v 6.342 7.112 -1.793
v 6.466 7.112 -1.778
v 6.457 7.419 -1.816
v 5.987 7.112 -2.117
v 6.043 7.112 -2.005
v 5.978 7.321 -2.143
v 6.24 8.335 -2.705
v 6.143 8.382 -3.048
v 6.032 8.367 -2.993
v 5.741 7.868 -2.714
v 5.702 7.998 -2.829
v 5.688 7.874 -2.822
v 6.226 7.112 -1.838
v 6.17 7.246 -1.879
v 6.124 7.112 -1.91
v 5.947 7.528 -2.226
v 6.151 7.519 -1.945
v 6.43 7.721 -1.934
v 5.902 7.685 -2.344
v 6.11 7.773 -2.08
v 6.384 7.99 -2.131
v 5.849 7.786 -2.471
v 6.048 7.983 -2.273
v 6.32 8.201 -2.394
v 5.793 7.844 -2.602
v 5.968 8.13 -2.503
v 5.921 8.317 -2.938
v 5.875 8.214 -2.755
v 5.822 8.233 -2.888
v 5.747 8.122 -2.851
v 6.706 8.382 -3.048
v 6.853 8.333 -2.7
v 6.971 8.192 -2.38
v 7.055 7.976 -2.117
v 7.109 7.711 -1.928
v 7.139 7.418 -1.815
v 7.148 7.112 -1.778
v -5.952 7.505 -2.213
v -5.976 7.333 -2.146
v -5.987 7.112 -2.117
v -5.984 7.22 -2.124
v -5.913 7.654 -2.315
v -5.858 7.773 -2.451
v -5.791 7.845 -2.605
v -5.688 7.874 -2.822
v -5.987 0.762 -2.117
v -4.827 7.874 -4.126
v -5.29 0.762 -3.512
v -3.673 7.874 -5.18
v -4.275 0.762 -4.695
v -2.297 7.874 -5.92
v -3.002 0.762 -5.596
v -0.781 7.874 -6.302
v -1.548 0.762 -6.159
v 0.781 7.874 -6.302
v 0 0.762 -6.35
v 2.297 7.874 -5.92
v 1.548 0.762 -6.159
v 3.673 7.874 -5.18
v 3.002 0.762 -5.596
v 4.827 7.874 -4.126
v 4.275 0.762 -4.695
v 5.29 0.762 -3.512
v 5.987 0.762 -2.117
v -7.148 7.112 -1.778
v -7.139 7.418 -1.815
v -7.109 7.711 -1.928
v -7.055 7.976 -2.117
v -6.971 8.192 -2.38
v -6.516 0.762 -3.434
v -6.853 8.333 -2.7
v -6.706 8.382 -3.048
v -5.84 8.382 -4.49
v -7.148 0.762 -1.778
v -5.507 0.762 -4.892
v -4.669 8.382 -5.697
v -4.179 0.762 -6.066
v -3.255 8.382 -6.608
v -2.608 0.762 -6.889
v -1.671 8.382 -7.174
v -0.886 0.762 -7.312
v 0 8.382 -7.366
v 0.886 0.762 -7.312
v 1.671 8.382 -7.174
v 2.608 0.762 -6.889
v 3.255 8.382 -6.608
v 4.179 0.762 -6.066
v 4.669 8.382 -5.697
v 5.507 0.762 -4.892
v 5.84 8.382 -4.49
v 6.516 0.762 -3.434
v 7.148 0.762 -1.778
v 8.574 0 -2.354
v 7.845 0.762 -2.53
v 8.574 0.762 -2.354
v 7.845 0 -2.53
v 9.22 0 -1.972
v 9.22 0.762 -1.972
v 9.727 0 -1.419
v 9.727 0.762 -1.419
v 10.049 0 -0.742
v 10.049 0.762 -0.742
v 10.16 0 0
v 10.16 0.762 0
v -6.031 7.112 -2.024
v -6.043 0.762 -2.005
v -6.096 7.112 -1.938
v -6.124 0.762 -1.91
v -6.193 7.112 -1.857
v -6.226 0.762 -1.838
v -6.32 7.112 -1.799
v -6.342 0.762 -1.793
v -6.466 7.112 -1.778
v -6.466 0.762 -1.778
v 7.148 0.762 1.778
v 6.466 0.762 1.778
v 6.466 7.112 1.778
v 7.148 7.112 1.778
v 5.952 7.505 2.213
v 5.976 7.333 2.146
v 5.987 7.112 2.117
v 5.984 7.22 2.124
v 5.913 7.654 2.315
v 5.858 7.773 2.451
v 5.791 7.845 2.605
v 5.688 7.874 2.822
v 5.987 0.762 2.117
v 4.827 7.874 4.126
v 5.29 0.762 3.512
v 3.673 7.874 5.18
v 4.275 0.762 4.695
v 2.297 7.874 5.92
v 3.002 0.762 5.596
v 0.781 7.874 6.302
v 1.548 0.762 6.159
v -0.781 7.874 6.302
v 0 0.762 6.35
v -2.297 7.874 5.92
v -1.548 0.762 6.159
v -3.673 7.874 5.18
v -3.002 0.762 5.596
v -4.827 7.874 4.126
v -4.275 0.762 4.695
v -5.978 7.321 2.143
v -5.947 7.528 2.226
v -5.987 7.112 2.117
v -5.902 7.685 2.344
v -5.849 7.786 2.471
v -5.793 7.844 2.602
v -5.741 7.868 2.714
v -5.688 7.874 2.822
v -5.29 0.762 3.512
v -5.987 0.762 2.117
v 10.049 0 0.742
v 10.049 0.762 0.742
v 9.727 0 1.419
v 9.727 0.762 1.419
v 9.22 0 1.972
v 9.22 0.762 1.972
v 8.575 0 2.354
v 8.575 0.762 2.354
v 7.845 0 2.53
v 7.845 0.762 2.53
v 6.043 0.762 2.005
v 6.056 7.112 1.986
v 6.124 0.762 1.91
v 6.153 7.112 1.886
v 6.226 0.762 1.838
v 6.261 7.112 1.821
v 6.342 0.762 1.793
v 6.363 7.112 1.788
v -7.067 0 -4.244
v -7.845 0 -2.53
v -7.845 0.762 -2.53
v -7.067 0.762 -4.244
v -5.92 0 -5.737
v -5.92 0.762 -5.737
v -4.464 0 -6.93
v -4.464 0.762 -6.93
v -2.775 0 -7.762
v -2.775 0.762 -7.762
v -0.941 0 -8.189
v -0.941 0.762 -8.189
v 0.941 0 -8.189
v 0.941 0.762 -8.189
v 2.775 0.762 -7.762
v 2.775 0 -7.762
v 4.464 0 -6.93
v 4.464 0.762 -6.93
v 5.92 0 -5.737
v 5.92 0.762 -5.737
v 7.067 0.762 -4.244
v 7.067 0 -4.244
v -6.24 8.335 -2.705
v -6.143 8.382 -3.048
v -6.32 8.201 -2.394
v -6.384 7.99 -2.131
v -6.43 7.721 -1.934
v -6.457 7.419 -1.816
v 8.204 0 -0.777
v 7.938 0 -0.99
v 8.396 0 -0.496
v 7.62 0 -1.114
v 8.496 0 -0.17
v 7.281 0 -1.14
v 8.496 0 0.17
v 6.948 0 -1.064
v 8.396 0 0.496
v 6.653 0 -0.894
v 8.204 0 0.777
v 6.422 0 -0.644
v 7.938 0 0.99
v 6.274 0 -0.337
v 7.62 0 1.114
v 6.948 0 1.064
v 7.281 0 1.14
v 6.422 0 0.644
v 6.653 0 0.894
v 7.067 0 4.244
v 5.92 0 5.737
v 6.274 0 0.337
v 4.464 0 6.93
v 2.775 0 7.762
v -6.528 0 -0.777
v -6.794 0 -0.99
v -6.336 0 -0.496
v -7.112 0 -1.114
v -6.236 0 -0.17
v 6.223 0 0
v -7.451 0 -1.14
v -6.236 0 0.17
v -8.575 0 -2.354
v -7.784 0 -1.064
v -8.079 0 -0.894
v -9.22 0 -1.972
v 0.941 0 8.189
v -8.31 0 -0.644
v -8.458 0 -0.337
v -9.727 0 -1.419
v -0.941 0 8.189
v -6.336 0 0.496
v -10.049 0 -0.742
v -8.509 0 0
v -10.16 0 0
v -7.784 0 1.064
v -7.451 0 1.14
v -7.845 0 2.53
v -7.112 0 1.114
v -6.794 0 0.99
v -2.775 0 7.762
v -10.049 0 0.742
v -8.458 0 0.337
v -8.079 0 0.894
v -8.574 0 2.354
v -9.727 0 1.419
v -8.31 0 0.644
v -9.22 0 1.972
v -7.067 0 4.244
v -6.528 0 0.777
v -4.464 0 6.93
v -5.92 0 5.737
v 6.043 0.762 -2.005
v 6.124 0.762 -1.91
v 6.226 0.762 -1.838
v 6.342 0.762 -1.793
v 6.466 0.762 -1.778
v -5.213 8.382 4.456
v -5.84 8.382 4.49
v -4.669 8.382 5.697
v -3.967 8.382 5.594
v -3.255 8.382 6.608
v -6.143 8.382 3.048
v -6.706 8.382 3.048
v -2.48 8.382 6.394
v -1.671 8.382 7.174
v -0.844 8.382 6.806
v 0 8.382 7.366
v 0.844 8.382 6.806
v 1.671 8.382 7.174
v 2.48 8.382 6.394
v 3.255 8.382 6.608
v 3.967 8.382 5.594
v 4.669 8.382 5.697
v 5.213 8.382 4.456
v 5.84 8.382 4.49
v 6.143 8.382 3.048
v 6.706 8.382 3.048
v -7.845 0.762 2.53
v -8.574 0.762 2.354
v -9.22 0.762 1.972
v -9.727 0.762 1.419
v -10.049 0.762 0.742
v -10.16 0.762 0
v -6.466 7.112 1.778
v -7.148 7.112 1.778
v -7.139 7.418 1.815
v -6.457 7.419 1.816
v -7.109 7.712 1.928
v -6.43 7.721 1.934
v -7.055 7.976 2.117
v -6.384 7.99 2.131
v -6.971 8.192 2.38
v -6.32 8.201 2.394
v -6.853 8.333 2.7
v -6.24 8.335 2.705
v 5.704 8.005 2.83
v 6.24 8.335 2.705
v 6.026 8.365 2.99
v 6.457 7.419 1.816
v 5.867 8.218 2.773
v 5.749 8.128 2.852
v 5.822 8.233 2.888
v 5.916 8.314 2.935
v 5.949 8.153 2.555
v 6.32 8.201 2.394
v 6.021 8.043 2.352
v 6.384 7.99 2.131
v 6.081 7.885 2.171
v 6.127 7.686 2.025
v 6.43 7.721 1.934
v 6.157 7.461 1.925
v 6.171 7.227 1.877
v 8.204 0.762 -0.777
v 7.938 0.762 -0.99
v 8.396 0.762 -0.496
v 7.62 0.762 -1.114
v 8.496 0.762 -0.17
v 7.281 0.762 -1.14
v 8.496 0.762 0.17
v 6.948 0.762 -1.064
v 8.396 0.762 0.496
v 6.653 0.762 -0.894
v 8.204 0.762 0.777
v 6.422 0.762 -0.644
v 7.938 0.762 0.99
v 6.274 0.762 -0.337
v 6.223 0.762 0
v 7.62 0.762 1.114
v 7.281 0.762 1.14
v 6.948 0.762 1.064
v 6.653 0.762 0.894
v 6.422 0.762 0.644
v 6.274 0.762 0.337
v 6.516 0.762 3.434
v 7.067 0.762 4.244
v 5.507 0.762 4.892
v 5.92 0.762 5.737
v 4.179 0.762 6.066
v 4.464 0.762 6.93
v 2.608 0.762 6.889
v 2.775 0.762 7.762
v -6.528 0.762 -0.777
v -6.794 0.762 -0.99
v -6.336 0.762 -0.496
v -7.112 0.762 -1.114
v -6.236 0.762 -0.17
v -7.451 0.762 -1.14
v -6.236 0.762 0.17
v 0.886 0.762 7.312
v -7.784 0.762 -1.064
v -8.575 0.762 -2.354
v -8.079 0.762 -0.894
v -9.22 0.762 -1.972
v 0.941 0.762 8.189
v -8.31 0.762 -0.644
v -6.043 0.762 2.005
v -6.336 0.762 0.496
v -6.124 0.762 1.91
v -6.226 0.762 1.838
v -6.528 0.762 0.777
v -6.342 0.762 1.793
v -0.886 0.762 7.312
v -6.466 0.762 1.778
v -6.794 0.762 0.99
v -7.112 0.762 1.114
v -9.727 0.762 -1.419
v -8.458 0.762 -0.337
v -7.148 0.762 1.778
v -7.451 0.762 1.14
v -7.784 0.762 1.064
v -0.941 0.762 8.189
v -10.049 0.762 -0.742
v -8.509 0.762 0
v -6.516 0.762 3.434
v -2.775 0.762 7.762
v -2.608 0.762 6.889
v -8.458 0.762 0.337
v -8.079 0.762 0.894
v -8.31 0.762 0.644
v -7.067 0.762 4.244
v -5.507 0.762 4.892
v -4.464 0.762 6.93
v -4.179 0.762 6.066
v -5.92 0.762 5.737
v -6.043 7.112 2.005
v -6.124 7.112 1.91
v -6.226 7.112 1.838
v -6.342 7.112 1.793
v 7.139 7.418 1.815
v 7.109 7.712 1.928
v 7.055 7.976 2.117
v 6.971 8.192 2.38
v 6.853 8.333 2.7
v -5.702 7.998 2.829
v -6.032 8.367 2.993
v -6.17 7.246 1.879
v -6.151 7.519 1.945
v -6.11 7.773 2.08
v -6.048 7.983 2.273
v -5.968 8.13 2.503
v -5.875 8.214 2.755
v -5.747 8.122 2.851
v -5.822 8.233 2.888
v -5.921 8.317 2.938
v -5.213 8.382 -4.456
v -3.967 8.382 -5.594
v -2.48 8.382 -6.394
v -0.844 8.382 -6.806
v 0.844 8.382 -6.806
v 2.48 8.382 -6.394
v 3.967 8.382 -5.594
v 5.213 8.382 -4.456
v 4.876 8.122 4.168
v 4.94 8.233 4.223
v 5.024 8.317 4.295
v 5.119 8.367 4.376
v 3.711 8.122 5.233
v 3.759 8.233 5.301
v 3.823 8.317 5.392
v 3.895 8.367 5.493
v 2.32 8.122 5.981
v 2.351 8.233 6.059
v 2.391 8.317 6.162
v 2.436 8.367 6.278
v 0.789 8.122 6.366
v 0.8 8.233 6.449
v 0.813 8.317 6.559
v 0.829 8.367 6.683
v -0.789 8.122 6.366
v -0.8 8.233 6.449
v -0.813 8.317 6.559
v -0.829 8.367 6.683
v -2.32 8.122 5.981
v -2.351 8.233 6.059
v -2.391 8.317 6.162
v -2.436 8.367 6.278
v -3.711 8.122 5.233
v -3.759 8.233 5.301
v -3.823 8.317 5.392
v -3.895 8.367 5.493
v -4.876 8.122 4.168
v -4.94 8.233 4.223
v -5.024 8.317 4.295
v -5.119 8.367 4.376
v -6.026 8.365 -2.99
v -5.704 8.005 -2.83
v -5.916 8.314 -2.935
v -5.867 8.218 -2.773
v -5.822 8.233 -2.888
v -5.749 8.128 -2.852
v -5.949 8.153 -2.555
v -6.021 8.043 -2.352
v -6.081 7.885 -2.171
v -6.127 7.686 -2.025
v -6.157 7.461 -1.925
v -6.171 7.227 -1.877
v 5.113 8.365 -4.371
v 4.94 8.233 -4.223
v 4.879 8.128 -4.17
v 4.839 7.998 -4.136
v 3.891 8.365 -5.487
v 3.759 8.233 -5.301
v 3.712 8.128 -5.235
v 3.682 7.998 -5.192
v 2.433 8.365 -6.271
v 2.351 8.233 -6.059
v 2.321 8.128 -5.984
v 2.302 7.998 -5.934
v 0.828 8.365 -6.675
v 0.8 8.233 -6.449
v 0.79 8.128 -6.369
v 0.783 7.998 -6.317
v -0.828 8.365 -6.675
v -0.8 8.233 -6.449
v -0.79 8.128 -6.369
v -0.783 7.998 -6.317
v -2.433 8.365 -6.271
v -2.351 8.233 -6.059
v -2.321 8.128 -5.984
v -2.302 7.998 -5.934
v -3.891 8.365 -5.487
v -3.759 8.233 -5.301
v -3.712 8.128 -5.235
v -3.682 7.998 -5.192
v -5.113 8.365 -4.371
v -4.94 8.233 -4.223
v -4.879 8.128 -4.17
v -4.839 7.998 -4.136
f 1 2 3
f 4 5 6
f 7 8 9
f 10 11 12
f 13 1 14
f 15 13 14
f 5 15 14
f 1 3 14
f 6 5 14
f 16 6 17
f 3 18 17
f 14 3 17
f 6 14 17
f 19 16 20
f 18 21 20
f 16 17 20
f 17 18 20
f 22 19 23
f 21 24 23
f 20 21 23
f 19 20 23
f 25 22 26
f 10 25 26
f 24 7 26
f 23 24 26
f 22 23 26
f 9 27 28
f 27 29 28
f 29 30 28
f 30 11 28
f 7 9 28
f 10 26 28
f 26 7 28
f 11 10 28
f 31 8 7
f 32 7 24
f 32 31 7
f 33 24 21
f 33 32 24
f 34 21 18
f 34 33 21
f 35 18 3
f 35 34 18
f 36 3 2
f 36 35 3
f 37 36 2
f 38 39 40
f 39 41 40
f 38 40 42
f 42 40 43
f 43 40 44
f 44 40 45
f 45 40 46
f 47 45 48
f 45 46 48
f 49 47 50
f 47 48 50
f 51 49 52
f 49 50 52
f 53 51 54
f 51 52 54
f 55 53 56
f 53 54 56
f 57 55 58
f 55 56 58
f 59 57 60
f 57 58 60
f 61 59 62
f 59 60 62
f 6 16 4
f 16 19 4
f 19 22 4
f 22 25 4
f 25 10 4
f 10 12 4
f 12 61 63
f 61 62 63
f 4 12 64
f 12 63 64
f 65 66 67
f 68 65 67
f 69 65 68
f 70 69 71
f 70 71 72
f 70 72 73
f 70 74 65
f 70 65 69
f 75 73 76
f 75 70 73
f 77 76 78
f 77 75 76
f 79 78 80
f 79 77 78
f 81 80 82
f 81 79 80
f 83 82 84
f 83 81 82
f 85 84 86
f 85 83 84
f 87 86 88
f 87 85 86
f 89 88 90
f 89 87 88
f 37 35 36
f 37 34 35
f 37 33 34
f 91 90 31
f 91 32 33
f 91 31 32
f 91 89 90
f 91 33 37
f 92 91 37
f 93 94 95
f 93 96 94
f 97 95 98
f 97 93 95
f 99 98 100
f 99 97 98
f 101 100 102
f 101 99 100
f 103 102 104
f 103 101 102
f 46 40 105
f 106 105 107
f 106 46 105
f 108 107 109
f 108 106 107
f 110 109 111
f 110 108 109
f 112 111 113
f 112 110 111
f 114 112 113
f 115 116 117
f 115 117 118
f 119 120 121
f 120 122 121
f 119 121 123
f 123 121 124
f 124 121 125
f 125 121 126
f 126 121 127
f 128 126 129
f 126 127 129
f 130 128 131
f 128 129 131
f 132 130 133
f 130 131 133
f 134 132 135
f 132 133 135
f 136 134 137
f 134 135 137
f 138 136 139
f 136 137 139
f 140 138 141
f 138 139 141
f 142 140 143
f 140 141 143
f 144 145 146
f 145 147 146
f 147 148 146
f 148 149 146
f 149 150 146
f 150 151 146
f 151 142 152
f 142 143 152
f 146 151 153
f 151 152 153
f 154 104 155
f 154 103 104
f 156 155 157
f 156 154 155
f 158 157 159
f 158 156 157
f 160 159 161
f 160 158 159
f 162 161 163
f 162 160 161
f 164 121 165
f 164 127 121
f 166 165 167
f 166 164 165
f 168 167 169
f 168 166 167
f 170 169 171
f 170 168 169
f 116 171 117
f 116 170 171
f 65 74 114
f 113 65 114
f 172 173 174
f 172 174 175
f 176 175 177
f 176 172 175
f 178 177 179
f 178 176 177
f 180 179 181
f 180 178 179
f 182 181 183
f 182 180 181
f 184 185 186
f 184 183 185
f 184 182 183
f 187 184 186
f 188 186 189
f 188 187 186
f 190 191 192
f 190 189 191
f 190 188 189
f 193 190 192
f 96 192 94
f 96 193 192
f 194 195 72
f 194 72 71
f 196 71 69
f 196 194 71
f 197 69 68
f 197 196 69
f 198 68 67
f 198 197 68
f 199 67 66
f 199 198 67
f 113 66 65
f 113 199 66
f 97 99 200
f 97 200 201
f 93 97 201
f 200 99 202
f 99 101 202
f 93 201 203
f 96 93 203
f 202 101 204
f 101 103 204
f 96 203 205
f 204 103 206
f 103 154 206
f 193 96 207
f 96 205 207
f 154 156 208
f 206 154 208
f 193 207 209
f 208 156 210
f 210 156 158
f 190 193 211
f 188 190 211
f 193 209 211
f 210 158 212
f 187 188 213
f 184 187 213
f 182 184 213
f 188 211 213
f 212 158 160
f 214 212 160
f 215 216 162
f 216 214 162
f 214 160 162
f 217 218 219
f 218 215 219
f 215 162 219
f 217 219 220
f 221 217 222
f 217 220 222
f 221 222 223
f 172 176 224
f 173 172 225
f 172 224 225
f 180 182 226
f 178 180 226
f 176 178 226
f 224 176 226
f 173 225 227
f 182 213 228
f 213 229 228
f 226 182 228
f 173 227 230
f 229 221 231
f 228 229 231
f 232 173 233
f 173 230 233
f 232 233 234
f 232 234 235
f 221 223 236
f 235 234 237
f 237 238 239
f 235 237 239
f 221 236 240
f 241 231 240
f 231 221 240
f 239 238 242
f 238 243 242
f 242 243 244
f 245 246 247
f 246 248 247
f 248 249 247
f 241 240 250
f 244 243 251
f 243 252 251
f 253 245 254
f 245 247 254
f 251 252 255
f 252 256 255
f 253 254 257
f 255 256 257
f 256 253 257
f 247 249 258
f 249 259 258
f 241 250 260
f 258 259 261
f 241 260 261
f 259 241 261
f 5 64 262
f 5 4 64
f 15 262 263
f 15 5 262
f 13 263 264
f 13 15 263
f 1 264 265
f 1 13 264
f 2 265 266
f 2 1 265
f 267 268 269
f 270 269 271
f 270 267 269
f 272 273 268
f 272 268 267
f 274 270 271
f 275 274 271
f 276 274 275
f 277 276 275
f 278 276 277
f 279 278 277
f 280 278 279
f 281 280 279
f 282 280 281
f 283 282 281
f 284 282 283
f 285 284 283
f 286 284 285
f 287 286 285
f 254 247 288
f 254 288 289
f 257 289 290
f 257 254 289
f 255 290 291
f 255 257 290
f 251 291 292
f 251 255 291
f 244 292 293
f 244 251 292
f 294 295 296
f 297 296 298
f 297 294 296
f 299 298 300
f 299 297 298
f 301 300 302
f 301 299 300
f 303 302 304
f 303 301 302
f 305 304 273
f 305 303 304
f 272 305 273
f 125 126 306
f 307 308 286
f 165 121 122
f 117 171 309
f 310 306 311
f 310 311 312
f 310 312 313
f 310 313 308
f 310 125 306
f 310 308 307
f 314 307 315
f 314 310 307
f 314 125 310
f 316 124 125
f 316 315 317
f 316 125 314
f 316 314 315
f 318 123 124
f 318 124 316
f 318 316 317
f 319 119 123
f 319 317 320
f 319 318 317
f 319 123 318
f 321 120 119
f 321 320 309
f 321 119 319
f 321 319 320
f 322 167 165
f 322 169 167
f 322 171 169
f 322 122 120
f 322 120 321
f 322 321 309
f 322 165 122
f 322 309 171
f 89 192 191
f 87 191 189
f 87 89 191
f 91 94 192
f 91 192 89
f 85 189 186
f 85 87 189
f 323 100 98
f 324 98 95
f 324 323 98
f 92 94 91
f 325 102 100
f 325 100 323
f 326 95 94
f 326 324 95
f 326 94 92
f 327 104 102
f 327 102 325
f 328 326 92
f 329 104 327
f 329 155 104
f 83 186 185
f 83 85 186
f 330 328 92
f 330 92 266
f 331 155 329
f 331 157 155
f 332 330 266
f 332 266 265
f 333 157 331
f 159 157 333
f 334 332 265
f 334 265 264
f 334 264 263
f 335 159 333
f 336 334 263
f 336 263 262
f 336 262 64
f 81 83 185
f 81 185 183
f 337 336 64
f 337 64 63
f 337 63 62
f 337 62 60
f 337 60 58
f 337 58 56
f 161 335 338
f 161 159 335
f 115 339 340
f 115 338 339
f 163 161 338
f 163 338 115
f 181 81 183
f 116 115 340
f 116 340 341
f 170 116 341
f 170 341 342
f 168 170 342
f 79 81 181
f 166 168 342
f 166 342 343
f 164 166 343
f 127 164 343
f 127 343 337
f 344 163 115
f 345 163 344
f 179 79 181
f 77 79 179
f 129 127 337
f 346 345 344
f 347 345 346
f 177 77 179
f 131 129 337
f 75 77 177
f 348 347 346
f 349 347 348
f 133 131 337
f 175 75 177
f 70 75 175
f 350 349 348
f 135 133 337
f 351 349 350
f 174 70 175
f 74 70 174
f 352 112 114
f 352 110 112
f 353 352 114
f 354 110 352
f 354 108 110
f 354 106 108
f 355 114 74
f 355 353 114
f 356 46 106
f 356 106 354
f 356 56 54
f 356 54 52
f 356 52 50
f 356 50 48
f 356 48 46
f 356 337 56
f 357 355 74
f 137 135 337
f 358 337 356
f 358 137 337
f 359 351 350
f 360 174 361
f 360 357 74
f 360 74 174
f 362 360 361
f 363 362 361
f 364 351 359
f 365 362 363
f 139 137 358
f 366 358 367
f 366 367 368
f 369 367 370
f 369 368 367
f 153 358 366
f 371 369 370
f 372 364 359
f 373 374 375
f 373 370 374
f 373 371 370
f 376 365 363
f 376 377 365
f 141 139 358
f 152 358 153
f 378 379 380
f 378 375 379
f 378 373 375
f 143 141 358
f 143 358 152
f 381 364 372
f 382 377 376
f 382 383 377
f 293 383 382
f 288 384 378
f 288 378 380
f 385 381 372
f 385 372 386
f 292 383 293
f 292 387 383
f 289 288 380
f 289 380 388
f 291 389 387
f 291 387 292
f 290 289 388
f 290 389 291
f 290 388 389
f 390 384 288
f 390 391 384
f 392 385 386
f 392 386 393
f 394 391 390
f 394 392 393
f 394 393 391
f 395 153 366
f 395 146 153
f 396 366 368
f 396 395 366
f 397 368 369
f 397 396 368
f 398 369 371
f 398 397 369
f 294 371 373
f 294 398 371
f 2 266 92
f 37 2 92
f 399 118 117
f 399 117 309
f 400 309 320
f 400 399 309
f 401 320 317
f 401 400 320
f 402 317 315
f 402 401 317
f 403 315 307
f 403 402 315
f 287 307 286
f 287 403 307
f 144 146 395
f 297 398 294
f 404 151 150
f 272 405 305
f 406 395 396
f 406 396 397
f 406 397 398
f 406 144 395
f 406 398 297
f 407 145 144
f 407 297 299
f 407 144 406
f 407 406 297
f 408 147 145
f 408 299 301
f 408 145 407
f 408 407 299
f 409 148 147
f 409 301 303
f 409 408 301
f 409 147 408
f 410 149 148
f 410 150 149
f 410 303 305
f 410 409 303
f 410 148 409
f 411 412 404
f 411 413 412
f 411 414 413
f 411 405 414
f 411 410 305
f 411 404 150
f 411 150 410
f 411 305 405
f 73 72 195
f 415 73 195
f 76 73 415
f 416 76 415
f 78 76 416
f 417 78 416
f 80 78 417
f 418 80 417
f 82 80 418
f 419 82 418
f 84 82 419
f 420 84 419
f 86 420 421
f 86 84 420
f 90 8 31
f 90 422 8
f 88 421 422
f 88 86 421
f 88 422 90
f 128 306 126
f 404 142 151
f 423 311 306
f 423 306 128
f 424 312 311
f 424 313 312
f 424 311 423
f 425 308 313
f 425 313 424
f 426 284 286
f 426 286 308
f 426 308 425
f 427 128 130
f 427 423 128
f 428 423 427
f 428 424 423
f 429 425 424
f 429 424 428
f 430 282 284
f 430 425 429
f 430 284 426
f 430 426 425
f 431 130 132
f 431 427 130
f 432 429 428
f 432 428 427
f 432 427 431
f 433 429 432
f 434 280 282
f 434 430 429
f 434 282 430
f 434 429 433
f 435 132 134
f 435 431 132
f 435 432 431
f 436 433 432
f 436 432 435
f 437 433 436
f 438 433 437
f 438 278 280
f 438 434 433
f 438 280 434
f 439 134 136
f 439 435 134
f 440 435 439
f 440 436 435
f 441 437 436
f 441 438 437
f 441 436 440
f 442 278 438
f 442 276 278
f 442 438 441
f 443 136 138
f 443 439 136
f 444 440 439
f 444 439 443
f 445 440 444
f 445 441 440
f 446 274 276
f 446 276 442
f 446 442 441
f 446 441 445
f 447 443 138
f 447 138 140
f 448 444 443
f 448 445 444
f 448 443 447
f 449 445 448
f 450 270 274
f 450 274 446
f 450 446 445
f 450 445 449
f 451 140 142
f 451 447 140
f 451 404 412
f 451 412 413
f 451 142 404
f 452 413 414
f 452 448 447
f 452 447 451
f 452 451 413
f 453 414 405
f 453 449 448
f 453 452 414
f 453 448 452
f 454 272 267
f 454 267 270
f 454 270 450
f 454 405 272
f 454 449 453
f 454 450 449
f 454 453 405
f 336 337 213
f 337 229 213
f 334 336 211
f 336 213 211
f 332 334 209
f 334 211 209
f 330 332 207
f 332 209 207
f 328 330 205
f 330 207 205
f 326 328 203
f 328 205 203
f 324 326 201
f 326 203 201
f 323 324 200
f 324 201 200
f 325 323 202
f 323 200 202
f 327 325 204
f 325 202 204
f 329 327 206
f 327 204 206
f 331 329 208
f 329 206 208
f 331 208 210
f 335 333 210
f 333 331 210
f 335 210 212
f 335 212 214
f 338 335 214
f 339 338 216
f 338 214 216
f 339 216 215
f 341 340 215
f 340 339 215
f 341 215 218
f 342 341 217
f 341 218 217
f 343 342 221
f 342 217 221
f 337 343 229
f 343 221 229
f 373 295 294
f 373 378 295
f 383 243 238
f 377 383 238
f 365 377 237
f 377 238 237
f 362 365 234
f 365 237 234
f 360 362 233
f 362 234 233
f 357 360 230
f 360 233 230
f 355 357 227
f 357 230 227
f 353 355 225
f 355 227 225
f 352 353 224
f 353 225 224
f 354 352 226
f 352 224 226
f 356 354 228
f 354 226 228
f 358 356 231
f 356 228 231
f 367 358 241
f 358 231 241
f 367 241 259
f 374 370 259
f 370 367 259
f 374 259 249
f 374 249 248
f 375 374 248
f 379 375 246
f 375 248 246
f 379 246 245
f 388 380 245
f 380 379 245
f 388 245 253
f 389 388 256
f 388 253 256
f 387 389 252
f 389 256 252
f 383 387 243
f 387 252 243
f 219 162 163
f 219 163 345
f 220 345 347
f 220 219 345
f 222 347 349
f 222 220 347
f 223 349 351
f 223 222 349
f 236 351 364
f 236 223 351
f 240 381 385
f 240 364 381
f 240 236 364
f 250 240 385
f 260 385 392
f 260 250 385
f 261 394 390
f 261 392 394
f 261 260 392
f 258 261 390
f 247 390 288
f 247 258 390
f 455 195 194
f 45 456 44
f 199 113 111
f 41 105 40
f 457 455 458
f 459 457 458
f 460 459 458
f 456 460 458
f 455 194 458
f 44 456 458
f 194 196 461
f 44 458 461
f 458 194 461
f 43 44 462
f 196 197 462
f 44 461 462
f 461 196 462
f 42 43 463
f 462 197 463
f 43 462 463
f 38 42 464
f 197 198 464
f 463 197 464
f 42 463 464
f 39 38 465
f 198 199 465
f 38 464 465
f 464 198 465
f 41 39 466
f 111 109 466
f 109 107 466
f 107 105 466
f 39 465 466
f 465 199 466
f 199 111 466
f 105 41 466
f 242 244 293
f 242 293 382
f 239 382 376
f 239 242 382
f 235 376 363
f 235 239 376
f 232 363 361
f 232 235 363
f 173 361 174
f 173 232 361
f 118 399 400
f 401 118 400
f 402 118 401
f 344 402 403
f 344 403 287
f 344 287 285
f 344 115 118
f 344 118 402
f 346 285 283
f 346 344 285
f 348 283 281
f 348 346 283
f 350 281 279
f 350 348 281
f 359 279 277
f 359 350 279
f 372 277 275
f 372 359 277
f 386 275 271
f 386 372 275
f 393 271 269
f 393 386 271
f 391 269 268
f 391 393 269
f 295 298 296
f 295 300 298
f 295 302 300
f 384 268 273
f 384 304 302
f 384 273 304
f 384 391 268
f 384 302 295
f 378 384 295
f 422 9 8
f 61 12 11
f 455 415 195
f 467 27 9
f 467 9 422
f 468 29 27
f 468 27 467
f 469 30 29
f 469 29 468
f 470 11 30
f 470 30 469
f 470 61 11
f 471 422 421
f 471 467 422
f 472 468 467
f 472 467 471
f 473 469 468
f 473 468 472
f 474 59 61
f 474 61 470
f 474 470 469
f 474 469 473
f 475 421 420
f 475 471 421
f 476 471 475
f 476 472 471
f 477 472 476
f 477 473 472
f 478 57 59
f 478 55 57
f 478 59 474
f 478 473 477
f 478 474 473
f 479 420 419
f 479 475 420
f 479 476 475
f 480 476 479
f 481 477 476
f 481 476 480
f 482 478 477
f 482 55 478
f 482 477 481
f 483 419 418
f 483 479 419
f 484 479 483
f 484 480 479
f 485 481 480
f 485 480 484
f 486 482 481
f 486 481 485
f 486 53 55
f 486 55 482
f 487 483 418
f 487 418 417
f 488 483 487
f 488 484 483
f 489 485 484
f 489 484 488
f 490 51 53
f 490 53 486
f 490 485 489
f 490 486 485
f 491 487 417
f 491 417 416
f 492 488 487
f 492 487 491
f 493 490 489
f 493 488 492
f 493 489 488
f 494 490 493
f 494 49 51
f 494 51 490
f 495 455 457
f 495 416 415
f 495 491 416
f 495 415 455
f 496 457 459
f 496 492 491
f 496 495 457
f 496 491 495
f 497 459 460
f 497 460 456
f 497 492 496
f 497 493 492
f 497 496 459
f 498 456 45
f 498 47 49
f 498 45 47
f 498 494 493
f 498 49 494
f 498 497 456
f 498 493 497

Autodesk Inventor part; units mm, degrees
ref_plane "YZ Plane" through (0, 0, 0) normal (1, 0, 0) x (0, 1, 0)
ref_plane "XZ Plane" through (0, 0, 0) normal (0, 1, 0) x (-1, 0, 0)
ref_plane "XY Plane" through (0, 0, 0) normal (0, 0, 1) x (1, 0, 0)
sketch "Sketch1" plane through (0, 0, 0) normal (0, 1, 0) x (-1, 0, 0)
  circle A0 centre (-7.366, 0) radius 1.143
  circle A1 centre (7.366, 0) radius 1.143
  line L0 (10.16, 0) -> (10.16, 0)
  line L1 (10.16, 0) -> (10.16, 0)
  line L2 (-10.16, 0) -> (-10.16, 0)
  line L3 (-10.16, 0) -> (-10.16, 0)
  arc A2 (-10.16, 0) -> (-7.62, -2.54) centre (-7.62, 0) ccw
  arc A3 (-7.8454, 2.53) -> (-10.16, 0) centre (-7.62, 0) ccw
  arc A4 (10.16, 0) -> (7.8454, 2.53) centre (7.62, 0) ccw
  arc A5 (7.8454, -2.53) -> (10.16, 0) centre (7.62, 0) ccw
  arc A6 (7.8454, 2.53) -> (-7.8454, 2.53) centre (0, 0) ccw
  arc A7 (-7.8454, -2.53) -> (7.8454, -2.53) centre (0, 0) ccw
  dimension "d2" = 2.286
  dimension "d15" = 2.54
  dimension "d16" = 2.54
  dimension "d17" = 2.54
extrude "Extrusion1" add sketch "Sketch1" along normal blind 0.762
sketch "Sketch2" plane through (0, 0.762, 0) normal (0, 1, 0) x (1, 0, 0)
  point P0 (0, 0)
sketch "Sketch3" plane through (0, 0.762, 0) normal (0, 1, 0) x (1, 0, 0)
  line L0 (-7.2575, -1.2599) -> (-7.2559, -1.2599)
  line L1 (-7.2559, -1.2599) -> (-7.2559, -1.269)
  line L2 (-7.1482, -1.778) -> (-6.096, -1.778)
  line L3 (-7.2559, 1.269) -> (-7.2559, 1.27)
  line L4 (-7.1482, 1.778) -> (-6.096, 1.778)
  arc A0 (7.1482, 1.778) -> (-7.1482, 1.778) centre (0, 0) ccw
  arc A1 (-7.2557, 1.27) -> (-7.2559, 1.269) centre (0, 0) ccw
  arc A2 (-7.2575, -1.2599) -> (-7.2559, -1.269) centre (0, 0) ccw
  arc A3 (-7.1482, -1.778) -> (7.1482, -1.778) centre (0, 0) ccw
  line L5 (-7.2575, -1.2599) -> (-7.2559, -1.2599)
  line L6 (6.096, -1.778) -> (7.1482, -1.778)
  line L7 (6.096, 1.778) -> (7.1482, 1.778)
  arc A4 (6.096, 1.778) -> (-6.096, 1.778) centre (0, 0) ccw
  arc A5 (-6.096, -1.778) -> (6.096, -1.778) centre (0, 0) ccw
extrude "Extrusion2" add sketch "Sketch3" along normal blind 7.62 contours A0 L7 A4 L4 | L2 A5 L6 A1
fillet "Fillet1" radius 1.27 4 edges at (6.6221, 8.382, 1.778) (-6.6221, 8.382, 1.778) (-6.6221, 8.382, -1.778) (6.6221, 8.382, -1.778)
fillet "Fillet2" radius 0.508 10 edges at (5.9835, 7.9854, -2.126) (6.096, 3.937, -1.778) (-5.9838, 7.9847, -2.1254) (-6.096, 3.937, -1.778) (0, 8.382, -6.35) (-5.9835, 7.9854, 2.126) (-6.096, 3.937, 1.778) (5.9835, 7.9854, 2.126) (6.096, 3.937, 1.778) (0, 8.382, 6.35)
properties part number "polulu_caster"
